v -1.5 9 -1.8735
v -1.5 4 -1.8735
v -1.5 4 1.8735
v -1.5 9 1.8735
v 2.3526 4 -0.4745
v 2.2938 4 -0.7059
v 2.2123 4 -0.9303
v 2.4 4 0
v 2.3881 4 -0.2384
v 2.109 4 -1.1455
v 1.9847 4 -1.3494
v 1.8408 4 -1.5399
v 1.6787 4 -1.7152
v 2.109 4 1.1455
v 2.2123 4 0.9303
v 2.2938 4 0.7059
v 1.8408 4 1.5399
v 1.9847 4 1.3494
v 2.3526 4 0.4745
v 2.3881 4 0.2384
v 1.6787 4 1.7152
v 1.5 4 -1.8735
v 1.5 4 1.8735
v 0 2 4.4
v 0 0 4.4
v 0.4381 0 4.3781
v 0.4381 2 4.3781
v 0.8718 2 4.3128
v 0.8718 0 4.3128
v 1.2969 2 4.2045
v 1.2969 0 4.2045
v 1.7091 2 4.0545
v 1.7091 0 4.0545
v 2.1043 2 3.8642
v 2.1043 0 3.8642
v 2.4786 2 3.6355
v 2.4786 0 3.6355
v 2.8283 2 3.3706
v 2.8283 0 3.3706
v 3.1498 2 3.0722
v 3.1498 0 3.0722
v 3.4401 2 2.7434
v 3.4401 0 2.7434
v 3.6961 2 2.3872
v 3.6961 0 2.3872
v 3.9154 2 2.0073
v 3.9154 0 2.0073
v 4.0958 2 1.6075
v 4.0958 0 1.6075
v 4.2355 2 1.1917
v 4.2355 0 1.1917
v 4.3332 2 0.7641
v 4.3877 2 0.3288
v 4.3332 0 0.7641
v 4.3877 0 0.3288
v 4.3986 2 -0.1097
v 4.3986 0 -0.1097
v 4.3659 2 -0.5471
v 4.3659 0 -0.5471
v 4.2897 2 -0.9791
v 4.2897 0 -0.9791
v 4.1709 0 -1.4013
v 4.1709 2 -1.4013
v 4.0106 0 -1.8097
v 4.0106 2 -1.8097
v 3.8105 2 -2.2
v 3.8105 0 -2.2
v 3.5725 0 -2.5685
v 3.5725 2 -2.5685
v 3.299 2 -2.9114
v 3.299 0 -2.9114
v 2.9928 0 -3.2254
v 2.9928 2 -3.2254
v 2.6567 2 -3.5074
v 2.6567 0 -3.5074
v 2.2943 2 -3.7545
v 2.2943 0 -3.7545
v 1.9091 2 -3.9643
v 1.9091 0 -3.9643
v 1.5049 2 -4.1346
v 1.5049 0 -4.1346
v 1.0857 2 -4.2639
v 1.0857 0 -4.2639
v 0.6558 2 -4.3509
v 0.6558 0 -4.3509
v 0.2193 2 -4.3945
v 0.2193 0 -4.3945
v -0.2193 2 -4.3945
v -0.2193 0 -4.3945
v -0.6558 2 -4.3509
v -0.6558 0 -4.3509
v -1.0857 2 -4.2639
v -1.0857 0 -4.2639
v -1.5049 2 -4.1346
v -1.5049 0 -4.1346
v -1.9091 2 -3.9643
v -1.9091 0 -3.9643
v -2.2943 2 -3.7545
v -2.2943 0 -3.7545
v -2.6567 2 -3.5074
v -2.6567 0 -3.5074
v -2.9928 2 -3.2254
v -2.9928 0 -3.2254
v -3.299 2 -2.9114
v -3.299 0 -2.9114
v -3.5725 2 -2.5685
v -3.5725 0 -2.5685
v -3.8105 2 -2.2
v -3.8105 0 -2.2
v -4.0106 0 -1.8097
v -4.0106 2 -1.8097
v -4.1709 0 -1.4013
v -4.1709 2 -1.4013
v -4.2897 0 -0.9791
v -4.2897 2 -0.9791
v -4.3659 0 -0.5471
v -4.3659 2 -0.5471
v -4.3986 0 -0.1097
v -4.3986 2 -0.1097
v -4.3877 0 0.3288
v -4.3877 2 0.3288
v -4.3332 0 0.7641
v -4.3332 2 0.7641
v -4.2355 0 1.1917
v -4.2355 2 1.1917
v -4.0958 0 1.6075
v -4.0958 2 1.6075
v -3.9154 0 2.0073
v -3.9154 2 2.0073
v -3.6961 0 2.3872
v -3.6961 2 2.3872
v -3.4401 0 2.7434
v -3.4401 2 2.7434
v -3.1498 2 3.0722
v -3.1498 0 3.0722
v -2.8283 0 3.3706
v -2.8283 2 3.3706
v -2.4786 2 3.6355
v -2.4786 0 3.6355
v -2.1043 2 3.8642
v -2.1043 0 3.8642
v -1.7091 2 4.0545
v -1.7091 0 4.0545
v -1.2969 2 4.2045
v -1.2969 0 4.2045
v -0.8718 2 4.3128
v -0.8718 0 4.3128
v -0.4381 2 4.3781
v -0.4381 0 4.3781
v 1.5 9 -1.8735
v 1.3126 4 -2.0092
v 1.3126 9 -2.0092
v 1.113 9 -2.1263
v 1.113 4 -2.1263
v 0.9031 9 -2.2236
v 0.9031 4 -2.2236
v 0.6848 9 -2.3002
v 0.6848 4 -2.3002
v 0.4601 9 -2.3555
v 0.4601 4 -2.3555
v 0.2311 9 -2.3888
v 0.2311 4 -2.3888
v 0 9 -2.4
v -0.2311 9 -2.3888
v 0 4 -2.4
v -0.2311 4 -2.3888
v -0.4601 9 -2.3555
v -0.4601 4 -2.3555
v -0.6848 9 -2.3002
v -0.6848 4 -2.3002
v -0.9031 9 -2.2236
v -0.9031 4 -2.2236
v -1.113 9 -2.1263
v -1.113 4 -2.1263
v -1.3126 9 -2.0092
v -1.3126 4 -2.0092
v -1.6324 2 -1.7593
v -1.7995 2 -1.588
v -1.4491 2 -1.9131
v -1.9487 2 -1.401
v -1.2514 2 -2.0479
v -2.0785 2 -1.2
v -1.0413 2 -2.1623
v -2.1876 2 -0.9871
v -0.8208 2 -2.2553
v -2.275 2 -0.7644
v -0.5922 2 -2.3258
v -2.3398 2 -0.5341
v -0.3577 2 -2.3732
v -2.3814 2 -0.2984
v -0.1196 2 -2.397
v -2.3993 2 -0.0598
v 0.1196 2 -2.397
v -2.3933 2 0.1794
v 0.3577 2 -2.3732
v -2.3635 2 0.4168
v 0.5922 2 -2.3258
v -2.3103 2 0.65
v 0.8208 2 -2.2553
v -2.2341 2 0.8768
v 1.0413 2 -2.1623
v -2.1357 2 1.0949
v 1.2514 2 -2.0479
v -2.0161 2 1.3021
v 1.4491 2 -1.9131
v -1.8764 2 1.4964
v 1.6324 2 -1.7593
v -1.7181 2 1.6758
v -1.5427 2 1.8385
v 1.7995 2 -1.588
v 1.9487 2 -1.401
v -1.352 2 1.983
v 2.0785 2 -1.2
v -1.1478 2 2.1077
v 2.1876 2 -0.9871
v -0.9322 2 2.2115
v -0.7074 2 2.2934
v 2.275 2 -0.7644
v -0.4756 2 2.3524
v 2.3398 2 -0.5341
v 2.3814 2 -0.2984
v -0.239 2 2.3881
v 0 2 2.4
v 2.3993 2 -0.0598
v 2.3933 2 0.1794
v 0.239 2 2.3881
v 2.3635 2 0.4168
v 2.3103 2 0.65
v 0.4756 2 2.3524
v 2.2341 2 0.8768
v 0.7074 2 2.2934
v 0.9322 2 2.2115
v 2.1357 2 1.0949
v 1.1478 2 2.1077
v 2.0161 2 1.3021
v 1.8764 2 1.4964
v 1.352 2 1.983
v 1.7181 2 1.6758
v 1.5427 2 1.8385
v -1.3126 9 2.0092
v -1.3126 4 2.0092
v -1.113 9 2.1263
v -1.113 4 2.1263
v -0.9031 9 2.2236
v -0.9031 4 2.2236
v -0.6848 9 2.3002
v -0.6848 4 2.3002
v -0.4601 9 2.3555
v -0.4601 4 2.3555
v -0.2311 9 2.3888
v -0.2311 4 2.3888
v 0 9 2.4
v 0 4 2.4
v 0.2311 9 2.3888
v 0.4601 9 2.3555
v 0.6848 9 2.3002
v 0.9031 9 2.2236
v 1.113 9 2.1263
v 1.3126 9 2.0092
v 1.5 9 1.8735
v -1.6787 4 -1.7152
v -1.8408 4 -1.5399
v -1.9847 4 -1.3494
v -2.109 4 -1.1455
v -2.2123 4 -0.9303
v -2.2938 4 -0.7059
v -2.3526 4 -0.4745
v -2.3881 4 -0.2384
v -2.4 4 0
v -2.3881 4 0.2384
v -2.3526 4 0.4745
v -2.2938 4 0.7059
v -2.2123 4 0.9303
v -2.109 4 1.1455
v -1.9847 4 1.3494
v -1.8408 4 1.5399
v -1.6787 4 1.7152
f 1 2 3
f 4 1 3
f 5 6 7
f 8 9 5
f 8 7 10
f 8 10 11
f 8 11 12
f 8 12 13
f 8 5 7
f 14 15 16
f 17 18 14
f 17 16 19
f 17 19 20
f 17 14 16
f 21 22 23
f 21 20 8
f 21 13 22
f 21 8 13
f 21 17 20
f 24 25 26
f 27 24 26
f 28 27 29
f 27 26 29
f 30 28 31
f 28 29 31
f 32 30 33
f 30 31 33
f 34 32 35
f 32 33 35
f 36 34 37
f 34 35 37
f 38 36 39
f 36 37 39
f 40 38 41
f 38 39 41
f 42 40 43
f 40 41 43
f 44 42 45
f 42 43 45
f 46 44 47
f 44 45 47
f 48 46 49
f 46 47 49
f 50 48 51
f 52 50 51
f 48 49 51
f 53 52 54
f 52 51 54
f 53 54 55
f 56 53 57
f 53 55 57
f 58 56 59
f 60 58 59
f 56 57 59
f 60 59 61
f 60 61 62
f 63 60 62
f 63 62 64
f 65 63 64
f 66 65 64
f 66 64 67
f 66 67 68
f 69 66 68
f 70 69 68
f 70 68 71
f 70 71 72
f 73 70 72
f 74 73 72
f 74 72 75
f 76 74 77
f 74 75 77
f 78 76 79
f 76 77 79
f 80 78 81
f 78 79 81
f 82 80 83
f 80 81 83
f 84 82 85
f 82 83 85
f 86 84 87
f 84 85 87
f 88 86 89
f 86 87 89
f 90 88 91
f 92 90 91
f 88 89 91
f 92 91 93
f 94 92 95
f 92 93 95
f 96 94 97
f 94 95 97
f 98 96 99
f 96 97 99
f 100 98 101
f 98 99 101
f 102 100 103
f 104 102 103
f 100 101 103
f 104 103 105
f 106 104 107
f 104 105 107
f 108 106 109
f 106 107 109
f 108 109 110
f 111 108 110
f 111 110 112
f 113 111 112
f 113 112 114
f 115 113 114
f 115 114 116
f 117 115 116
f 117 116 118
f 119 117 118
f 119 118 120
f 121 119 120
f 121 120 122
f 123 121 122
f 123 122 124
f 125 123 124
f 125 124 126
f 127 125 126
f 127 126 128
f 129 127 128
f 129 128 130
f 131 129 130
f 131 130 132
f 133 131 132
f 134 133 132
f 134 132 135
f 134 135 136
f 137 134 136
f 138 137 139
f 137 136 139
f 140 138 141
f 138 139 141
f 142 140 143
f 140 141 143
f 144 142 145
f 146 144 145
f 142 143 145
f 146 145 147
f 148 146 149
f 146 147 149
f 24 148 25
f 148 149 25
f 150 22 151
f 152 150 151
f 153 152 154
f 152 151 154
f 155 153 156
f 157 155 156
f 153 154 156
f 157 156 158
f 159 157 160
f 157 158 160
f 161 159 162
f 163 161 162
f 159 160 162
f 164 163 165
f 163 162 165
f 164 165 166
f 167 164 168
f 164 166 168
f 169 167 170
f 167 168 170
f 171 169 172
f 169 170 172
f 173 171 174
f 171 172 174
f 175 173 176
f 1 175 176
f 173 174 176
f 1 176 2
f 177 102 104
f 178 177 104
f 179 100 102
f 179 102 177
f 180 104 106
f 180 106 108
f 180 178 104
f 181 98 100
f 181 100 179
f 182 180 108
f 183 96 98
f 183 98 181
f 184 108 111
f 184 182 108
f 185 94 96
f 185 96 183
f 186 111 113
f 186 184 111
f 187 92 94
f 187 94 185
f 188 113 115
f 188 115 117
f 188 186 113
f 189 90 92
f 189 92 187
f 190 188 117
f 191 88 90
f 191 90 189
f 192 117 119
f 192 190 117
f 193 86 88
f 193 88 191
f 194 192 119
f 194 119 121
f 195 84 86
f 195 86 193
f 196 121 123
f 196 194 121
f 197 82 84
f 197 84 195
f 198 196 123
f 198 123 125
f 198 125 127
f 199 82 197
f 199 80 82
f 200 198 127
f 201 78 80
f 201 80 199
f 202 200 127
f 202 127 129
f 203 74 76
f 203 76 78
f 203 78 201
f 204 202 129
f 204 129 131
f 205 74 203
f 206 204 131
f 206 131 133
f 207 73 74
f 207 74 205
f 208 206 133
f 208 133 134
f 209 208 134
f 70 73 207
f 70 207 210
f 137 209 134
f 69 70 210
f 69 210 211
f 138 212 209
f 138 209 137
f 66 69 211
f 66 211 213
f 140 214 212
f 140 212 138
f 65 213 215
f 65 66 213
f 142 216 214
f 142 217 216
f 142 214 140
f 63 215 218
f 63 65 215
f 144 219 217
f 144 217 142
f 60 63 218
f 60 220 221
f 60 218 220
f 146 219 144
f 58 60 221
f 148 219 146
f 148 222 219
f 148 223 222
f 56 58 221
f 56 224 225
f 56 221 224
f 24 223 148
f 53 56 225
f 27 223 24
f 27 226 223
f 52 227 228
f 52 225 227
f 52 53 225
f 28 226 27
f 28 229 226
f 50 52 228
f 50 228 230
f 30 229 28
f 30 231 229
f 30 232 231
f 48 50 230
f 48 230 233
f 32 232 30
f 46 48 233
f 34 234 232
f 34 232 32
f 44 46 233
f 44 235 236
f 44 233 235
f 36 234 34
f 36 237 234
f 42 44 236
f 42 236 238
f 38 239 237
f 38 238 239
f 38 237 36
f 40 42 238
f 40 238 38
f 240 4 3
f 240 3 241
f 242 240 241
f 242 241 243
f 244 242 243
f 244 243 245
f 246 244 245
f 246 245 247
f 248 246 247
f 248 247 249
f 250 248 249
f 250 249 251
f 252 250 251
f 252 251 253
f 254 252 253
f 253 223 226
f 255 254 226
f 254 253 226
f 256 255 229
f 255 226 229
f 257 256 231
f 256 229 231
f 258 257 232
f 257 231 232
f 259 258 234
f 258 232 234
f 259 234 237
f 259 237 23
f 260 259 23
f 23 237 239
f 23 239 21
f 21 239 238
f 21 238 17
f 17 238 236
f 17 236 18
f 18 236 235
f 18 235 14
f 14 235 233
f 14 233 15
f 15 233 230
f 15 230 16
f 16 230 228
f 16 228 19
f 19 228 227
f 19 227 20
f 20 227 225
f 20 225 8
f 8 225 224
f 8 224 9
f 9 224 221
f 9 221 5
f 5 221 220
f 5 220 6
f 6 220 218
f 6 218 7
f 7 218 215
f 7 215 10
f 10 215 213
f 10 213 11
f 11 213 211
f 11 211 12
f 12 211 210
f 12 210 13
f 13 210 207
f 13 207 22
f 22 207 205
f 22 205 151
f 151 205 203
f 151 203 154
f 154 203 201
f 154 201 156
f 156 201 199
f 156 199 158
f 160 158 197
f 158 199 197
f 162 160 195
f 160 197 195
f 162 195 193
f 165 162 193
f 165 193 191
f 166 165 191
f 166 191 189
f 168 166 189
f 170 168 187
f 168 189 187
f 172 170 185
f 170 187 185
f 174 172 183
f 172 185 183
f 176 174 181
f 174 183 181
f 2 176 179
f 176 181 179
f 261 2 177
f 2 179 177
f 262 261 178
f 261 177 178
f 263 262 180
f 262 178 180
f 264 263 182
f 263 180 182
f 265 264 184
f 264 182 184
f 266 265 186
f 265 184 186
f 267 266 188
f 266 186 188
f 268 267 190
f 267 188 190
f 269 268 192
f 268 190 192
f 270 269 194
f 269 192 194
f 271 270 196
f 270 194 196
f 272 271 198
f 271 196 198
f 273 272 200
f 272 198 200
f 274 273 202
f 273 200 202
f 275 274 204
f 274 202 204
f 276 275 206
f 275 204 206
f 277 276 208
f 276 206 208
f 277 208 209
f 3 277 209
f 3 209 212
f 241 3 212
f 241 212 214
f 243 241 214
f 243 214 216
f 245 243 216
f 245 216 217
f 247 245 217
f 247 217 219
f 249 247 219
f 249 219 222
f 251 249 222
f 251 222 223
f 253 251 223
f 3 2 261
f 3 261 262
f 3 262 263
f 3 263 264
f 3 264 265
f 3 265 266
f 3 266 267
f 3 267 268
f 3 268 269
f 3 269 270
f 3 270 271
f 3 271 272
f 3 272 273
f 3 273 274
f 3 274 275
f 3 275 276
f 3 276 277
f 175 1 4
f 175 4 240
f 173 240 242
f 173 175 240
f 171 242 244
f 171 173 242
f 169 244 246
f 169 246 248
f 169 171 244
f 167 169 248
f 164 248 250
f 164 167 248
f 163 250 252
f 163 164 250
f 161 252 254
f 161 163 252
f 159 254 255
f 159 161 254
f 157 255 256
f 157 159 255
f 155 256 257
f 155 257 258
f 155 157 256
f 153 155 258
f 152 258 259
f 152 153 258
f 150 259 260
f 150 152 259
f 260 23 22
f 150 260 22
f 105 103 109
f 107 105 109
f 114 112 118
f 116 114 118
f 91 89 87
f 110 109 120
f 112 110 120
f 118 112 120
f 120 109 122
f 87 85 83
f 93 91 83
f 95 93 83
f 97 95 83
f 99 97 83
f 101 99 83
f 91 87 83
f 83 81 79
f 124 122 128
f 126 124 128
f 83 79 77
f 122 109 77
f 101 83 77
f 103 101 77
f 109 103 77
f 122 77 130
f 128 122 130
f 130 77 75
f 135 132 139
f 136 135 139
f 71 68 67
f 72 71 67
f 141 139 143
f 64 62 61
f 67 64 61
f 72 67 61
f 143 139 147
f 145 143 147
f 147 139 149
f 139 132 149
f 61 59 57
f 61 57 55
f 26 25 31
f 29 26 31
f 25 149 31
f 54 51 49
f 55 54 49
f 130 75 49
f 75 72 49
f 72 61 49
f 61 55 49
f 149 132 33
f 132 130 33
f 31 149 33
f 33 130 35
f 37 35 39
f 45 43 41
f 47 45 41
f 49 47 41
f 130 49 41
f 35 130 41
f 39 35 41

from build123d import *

# Parameters (mm, degrees)
SKETCH1_R           = 4.4
BOSS_EXTRUDE1_DEPTH = 2
SKETCH2_R           = 2.4
BOSS_EXTRUDE2_DEPTH = 2
SKETCH3_W           = 3
SKETCH3_H           = 3
BOSS_EXTRUDE3_DEPTH = 5


with BuildPart() as part:
    # Sketch1 → Boss-Extrude1 (new body)
    with BuildSketch(Plane(origin=(0, 0, 0), x_dir=(1, 0, 0), z_dir=(0, 1, 0))):
        with Locations(Location((0, 0, 0), (0, 0, 270))):
            Circle(SKETCH1_R)
    extrude(amount=BOSS_EXTRUDE1_DEPTH)

    # Sketch2 → Boss-Extrude2 (add)
    with BuildSketch(Plane(origin=(0, 2, 0), x_dir=(1, 0, 0), z_dir=(0, 1, 0))):
        with Locations(Location((0, 0, 0), (0, 0, 270))):
            Circle(SKETCH2_R)
    extrude(amount=BOSS_EXTRUDE2_DEPTH)

    # Sketch3 → Boss-Extrude3 (add)
    with BuildSketch(Plane(origin=(0, 4, 0), x_dir=(1, 0, 0), z_dir=(0, 1, 0))):
        with BuildLine():
            ThreePointArc((1.5, 1.8734994), (0, 2.4), (-1.5, 1.8734994))
            Line((-1.5, 1.8734994), (-1.5, 1.5))
            Line((-1.5, 1.5), (1.5, 1.5))
            Line((1.5, 1.5), (1.5, 1.8734994))
        make_face()
        Rectangle(SKETCH3_W, SKETCH3_H)
        with BuildLine():
            Line((1.5, -1.5), (-1.5, -1.5))
            Line((-1.5, -1.5), (-1.5, -1.8734994))
            ThreePointArc((-1.5, -1.8734994), (0, -2.4), (1.5, -1.8734994))
            Line((1.5, -1.8734994), (1.5, -1.5))
        make_face()
    extrude(amount=BOSS_EXTRUDE3_DEPTH)


solid = part.part
